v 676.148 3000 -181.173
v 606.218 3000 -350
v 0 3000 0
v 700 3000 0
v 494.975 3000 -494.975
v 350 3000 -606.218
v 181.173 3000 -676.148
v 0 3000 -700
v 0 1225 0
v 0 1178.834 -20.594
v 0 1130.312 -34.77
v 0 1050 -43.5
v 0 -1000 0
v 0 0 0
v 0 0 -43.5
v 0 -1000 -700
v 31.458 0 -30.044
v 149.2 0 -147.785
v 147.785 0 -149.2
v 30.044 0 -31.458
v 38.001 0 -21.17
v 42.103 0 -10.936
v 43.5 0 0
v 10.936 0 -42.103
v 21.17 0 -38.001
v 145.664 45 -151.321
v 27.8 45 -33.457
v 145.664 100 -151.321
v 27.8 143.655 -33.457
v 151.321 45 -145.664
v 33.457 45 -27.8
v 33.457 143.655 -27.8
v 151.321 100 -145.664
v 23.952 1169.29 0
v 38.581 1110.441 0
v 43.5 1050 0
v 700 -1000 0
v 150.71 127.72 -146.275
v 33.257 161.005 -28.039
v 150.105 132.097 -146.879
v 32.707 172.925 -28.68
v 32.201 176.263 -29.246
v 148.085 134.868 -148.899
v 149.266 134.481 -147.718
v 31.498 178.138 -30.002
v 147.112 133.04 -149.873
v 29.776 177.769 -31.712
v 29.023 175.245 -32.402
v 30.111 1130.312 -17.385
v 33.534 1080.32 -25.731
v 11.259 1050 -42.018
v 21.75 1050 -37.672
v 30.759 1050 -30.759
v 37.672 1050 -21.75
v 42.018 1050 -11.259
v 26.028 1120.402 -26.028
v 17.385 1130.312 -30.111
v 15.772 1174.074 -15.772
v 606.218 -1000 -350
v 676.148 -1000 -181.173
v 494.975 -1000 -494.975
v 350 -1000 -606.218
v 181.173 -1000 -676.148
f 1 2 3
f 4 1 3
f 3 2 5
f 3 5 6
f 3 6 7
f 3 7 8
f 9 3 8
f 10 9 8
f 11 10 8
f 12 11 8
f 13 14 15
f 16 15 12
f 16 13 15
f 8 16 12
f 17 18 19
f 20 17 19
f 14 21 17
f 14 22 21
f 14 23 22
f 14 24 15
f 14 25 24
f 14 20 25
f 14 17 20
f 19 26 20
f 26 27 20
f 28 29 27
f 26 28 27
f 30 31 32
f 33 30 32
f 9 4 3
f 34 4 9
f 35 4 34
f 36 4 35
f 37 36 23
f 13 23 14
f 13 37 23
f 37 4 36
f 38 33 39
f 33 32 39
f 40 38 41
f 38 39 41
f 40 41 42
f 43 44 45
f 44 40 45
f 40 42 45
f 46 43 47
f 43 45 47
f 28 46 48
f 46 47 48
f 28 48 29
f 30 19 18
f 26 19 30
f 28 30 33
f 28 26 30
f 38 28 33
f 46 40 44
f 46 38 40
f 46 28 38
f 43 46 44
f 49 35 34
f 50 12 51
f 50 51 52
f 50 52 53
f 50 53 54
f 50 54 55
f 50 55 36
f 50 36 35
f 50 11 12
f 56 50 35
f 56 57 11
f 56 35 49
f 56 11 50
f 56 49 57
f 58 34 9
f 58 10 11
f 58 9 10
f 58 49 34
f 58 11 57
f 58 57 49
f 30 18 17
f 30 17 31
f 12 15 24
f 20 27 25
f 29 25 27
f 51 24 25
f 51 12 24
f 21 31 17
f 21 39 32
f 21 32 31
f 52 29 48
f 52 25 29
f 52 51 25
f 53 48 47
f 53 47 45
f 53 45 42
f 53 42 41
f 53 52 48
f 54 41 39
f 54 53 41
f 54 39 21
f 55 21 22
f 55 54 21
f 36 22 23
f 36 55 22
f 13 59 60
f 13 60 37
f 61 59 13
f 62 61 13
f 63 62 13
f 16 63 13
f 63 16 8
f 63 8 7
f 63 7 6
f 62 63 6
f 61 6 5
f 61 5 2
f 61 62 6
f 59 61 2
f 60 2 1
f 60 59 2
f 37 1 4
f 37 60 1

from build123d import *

# Parameters (mm, degrees)
INLET_SECTION_DEPTH  = 3000
OUTLET_START         = -1000
OUTLET_SECTION_DEPTH = 1000


with BuildPart() as part:
    # Sketch1 → Inlet Section (new body)
    with BuildSketch(Plane(origin=(0, 0, 0), x_dir=(1, 0, 0), z_dir=(0, 1, 0))):
        with BuildLine():
            Line((700, 0), (0, 0))
            Line((0, 0), (0, 700))
            ThreePointArc((0, 700), (494.974746831, 494.974746831), (700, 0))
        make_face()
    extrude(amount=INLET_SECTION_DEPTH)

    # Sketch1<2> → Outlet Section (add)
    with BuildSketch(Plane(origin=(0, 0, 0), x_dir=(1, 0, 0), z_dir=(0, 1, 0)).offset(OUTLET_START)):
        with BuildLine():
            Line((700, 0), (0, 0))
            Line((0, 0), (0, 700))
            ThreePointArc((0, 700), (494.974746831, 494.974746831), (700, 0))
        make_face()
    extrude(amount=OUTLET_SECTION_DEPTH)

    # Sketch2 → Rocket Body (revolve, cut)
    with BuildSketch(Plane.XY):
        with BuildLine():
            Line((0, 0), (43.5, 0))
            Line((43.5, 0), (43.5, 1050))
            ThreePointArc((43.5, 1050), (32.462012135, 1140.162700159), (0, 1225))
            Line((0, 1225), (0, 0))
        make_face()
    revolve(axis=Axis((0, 1225, 0), (0, -1, 0)), mode=Mode.SUBTRACT)

    # Sketch5 → Fin section 0
    with BuildSketch(Plane(origin=(148.492424049, 0, -148.492424049), x_dir=(-0.7071067811865414, 0, -0.7071067811865537), z_dir=(0.7071067811865537, 0, -0.7071067811865414))):
        with BuildLine():
            Line((1, 0), (-1, 0))
            add(Edge.make_bspline(
                [(-1, 0), (-2.806434263, 15.569219932), (-3.946739239, 29.594971133), (-4, 45)],
                knots=[0, 0, 0, 0, 1, 1, 1, 1], degree=3))
            Line((-4, 45), (-4, 100))
            add(Edge.make_bspline(
                [(0, 135), (-4, 135), (-4, 117.5), (-4, 100)],
                knots=[0, 0, 0, 0, 1, 1, 1, 1], degree=3))
            add(Edge.make_bspline(
                [(0, 135), (4, 135), (4, 117.5), (4, 100)],
                knots=[0, 0, 0, 0, 1, 1, 1, 1], degree=3))
            Line((4, 100), (4, 45))
            add(Edge.make_bspline(
                [(1, 0), (2.806434263, 15.569219932), (3.946739239, 29.594971133), (4, 45)],
                knots=[0, 0, 0, 0, 1, 1, 1, 1], degree=3))
        make_face()
    # Sketch4 → Fin section 1
    with BuildSketch(Plane(origin=(0, 0, 0), x_dir=(-0.7071067811865414, 0, -0.7071067811865537), z_dir=(0.7071067811865537, 0, -0.7071067811865414))):
        with BuildLine():
            Line((4, 45), (4, 155))
            add(Edge.make_bspline(
                [(0, 190), (4, 190), (3.555879761, 173.373397407), (4, 155)],
                knots=[0, 0, 0, 0, 1, 1, 1, 1], degree=3))
            add(Edge.make_bspline(
                [(0, 190), (-4, 190), (-3.555879761, 173.373397407), (-4, 155)],
                knots=[0, 0, 0, 0, 1, 1, 1, 1], degree=3))
            Line((-4, 155), (-4, 45))
            add(Edge.make_bspline(
                [(-1, 0), (-3.156657645, 16.863770489), (-3.729577703, 30.414594212), (-4, 45)],
                knots=[0, 0, 0, 0, 1, 1, 1, 1], degree=3))
            Line((-1, 0), (1, 0))
            add(Edge.make_bspline(
                [(1, 0), (3.156657645, 16.863770489), (3.729577703, 30.414594212), (4, 45)],
                knots=[0, 0, 0, 0, 1, 1, 1, 1], degree=3))
        make_face()
    loft(mode=Mode.SUBTRACT)


solid = part.part
